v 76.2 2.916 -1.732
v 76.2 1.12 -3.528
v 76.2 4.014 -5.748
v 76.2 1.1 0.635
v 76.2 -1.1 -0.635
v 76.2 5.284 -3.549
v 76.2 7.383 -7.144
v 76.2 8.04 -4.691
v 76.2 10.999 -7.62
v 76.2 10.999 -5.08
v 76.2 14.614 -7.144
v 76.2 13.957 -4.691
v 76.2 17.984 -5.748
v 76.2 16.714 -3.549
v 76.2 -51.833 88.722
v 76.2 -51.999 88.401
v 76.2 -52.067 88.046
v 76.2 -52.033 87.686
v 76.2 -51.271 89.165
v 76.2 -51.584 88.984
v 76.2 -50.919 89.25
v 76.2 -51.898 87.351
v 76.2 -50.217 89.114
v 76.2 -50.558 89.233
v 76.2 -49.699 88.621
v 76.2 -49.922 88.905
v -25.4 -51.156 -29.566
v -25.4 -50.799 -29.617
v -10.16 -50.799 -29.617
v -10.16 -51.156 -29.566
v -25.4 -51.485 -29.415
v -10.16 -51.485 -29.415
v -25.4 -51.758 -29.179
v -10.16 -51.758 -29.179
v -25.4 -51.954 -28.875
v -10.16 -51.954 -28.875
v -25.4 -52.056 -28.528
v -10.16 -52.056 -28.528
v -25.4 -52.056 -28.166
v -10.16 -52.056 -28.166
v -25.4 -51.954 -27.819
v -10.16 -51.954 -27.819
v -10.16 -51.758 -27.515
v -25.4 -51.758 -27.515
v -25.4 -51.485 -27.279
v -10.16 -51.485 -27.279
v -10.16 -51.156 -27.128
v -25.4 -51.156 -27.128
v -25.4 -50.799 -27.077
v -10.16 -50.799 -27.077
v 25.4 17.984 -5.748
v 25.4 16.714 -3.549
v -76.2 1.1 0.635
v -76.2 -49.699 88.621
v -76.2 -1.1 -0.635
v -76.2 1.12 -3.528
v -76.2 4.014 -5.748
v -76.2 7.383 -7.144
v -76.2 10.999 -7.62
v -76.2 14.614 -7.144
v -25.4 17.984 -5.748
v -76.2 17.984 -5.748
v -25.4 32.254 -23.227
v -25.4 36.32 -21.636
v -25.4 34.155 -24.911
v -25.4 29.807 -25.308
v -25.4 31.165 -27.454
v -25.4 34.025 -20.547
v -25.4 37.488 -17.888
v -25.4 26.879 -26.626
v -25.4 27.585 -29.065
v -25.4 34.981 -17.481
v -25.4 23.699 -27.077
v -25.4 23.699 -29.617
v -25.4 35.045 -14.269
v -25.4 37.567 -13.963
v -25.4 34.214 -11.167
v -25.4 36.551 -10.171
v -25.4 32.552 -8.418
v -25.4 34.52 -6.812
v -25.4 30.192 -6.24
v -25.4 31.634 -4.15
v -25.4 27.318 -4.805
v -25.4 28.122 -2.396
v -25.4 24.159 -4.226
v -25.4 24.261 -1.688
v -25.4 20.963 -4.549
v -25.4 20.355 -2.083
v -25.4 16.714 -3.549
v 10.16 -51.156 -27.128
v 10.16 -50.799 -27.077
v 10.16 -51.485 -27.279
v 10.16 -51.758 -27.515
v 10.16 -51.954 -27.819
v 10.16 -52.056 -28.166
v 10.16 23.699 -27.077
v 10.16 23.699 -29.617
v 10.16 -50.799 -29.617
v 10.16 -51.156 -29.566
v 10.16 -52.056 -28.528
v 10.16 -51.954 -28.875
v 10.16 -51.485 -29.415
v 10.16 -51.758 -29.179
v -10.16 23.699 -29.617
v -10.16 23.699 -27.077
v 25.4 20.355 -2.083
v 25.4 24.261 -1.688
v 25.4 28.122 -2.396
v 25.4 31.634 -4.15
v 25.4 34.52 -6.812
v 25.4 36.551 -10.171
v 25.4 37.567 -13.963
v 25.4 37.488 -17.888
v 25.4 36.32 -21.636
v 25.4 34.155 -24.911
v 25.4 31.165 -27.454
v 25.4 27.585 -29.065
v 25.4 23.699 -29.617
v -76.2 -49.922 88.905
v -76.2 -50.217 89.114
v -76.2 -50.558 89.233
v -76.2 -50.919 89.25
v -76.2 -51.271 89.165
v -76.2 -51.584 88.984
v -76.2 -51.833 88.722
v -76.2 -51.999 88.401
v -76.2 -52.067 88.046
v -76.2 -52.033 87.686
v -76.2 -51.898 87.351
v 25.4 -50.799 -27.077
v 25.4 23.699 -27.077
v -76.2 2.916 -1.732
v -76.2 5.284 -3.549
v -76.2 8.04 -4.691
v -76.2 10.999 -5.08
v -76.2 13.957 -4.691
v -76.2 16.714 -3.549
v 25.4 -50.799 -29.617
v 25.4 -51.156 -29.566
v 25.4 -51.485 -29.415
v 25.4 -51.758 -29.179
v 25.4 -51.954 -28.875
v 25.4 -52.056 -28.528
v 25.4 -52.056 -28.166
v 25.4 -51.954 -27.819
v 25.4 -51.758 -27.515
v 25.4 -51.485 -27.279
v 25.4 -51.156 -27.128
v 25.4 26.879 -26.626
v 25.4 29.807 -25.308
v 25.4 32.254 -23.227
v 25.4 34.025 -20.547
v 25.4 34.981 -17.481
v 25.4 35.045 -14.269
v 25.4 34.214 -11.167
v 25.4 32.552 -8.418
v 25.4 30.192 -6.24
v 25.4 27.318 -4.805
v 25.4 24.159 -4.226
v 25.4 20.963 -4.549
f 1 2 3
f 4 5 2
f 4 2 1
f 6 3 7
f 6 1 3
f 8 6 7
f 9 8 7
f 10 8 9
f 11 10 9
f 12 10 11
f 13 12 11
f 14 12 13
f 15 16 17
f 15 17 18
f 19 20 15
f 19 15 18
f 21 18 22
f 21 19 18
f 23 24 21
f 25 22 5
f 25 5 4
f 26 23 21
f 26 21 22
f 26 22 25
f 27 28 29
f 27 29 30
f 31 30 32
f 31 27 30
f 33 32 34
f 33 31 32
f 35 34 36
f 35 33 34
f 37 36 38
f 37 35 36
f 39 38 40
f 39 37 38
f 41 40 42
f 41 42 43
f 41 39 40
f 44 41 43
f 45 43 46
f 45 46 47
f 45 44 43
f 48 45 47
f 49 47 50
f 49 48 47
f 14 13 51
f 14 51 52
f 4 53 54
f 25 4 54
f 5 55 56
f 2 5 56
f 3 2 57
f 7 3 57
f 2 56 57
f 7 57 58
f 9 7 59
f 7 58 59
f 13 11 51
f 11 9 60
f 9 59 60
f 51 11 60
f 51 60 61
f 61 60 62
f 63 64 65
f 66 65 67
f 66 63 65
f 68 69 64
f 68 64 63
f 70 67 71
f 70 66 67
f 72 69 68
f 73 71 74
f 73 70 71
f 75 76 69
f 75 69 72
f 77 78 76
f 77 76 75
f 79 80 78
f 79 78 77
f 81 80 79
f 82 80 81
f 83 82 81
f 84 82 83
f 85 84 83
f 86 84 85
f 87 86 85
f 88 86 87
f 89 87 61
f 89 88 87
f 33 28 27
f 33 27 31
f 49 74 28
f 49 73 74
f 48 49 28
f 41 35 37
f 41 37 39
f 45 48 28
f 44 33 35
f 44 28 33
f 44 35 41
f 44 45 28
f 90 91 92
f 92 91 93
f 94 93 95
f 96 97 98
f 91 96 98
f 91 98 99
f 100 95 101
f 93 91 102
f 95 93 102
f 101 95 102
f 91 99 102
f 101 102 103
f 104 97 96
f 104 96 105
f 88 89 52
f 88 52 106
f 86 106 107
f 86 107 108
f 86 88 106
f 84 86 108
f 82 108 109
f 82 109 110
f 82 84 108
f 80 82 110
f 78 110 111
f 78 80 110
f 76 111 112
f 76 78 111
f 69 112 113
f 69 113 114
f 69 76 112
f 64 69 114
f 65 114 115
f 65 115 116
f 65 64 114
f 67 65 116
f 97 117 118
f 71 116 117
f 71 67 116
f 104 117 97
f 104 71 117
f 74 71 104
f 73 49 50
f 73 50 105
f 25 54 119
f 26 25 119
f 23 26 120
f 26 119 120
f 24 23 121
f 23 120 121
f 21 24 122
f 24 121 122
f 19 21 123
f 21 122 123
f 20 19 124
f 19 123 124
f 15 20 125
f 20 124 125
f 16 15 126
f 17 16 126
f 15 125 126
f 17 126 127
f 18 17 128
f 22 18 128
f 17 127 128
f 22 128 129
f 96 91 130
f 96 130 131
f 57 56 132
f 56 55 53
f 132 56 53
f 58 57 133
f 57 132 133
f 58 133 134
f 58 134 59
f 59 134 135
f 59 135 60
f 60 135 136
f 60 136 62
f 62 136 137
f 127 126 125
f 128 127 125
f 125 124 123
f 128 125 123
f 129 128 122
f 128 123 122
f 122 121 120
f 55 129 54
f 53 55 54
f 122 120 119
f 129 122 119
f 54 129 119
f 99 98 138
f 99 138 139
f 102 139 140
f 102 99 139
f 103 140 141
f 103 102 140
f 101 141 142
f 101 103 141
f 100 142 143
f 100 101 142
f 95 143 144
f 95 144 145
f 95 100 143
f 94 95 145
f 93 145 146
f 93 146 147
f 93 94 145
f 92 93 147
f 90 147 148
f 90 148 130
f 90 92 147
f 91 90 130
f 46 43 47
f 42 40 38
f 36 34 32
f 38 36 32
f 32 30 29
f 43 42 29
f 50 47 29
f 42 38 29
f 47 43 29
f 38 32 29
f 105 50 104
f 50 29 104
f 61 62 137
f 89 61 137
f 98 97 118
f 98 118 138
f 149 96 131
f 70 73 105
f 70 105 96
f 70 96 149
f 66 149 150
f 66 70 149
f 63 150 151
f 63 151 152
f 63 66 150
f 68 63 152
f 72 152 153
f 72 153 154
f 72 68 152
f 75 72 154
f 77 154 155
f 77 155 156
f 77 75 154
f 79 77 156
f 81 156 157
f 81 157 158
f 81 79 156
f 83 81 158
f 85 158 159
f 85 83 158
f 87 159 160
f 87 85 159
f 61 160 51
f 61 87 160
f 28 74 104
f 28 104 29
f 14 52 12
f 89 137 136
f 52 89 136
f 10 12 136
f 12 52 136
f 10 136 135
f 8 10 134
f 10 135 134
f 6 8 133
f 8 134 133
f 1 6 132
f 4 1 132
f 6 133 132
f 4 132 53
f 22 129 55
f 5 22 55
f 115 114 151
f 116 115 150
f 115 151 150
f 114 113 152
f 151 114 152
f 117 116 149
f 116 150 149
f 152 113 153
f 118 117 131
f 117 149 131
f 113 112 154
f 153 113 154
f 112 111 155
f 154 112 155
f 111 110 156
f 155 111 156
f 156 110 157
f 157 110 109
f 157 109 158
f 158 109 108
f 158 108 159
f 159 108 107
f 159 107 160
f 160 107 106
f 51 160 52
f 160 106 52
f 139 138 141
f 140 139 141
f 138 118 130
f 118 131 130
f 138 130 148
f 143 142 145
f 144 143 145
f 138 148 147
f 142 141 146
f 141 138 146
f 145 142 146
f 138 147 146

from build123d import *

# Parameters (mm, degrees)
BOSS_EXTRUDE1_DEPTH      = 76.2
BOSS_EXTRUDE1_DEPTH_BACK = 76.2
BOSS_EXTRUDE3_DEPTH      = 25.4
BOSS_EXTRUDE3_DEPTH_BACK = 25.4
CUT_EXTRUDE2_DEPTH       = 3.81


with BuildPart() as part:
    # Sketch1 → Boss-Extrude1 (new, two sides: drawn at the far end of the back side and taken through both)
    with BuildSketch(Plane.YZ.offset(-BOSS_EXTRUDE1_DEPTH_BACK)):
        with BuildLine():
            Line((17.983522628, -5.748374891), (16.713522628, -3.548670365))
            ThreePointArc((16.713522628, -3.548670365), (8.040220943, -4.690532194), (1.099852263, 0.635))
            Line((1.099852263, 0.635), (-49.698657582, 88.6206))
            ThreePointArc((-49.698657582, 88.6206), (-51.433509845, 89.085452263), (-51.898362108, 87.3506))
            Line((-51.898362108, 87.3506), (-1.099852263, -0.635))
            ThreePointArc((-1.099852263, -0.635), (7.382820568, -7.143983793), (17.983522628, -5.748374891))
        make_face()
    extrude(amount=BOSS_EXTRUDE1_DEPTH + BOSS_EXTRUDE1_DEPTH_BACK)

    # Sketch1<5> → Boss-Extrude3 (add, two sides: drawn at the far end of the back side and taken through both)
    with BuildSketch(Plane.YZ.offset(-BOSS_EXTRUDE3_DEPTH_BACK)):
        with BuildLine():
            Line((-50.798509845, -29.617045256), (23.698522628, -29.617045256))
            ThreePointArc((23.698522628, -29.617045256), (37.192506421, -12.031343196), (16.713522628, -3.548670365))
            Line((16.713522628, -3.548670365), (17.983522628, -5.748374891))
            ThreePointArc((17.983522628, -5.748374891), (34.739054823, -12.688743571), (23.698522628, -27.077045256))
            Line((23.698522628, -27.077045256), (-50.798509845, -27.077045256))
            ThreePointArc((-50.798509845, -27.077045256), (-52.068509845, -28.347045256), (-50.798509845, -29.617045256))
        make_face()
    extrude(amount=BOSS_EXTRUDE3_DEPTH + BOSS_EXTRUDE3_DEPTH_BACK)

    # Sketch5 → Cut-Extrude2 (cut)
    with BuildSketch(Plane(origin=(0, 0, -29.617045256), x_dir=(1, 0, 0), z_dir=(0, 0, -1))):
        Polygon((10.16, 50.798509845), (10.16, -23.698522628), (-10.16, -23.698522628), (-10.16, 50.798509845), (-10.16, 53.498166753), (0, 53.498166753), (10.16, 53.498166753), align=None)
    extrude(amount=-CUT_EXTRUDE2_DEPTH, mode=Mode.SUBTRACT)


solid = part.part
